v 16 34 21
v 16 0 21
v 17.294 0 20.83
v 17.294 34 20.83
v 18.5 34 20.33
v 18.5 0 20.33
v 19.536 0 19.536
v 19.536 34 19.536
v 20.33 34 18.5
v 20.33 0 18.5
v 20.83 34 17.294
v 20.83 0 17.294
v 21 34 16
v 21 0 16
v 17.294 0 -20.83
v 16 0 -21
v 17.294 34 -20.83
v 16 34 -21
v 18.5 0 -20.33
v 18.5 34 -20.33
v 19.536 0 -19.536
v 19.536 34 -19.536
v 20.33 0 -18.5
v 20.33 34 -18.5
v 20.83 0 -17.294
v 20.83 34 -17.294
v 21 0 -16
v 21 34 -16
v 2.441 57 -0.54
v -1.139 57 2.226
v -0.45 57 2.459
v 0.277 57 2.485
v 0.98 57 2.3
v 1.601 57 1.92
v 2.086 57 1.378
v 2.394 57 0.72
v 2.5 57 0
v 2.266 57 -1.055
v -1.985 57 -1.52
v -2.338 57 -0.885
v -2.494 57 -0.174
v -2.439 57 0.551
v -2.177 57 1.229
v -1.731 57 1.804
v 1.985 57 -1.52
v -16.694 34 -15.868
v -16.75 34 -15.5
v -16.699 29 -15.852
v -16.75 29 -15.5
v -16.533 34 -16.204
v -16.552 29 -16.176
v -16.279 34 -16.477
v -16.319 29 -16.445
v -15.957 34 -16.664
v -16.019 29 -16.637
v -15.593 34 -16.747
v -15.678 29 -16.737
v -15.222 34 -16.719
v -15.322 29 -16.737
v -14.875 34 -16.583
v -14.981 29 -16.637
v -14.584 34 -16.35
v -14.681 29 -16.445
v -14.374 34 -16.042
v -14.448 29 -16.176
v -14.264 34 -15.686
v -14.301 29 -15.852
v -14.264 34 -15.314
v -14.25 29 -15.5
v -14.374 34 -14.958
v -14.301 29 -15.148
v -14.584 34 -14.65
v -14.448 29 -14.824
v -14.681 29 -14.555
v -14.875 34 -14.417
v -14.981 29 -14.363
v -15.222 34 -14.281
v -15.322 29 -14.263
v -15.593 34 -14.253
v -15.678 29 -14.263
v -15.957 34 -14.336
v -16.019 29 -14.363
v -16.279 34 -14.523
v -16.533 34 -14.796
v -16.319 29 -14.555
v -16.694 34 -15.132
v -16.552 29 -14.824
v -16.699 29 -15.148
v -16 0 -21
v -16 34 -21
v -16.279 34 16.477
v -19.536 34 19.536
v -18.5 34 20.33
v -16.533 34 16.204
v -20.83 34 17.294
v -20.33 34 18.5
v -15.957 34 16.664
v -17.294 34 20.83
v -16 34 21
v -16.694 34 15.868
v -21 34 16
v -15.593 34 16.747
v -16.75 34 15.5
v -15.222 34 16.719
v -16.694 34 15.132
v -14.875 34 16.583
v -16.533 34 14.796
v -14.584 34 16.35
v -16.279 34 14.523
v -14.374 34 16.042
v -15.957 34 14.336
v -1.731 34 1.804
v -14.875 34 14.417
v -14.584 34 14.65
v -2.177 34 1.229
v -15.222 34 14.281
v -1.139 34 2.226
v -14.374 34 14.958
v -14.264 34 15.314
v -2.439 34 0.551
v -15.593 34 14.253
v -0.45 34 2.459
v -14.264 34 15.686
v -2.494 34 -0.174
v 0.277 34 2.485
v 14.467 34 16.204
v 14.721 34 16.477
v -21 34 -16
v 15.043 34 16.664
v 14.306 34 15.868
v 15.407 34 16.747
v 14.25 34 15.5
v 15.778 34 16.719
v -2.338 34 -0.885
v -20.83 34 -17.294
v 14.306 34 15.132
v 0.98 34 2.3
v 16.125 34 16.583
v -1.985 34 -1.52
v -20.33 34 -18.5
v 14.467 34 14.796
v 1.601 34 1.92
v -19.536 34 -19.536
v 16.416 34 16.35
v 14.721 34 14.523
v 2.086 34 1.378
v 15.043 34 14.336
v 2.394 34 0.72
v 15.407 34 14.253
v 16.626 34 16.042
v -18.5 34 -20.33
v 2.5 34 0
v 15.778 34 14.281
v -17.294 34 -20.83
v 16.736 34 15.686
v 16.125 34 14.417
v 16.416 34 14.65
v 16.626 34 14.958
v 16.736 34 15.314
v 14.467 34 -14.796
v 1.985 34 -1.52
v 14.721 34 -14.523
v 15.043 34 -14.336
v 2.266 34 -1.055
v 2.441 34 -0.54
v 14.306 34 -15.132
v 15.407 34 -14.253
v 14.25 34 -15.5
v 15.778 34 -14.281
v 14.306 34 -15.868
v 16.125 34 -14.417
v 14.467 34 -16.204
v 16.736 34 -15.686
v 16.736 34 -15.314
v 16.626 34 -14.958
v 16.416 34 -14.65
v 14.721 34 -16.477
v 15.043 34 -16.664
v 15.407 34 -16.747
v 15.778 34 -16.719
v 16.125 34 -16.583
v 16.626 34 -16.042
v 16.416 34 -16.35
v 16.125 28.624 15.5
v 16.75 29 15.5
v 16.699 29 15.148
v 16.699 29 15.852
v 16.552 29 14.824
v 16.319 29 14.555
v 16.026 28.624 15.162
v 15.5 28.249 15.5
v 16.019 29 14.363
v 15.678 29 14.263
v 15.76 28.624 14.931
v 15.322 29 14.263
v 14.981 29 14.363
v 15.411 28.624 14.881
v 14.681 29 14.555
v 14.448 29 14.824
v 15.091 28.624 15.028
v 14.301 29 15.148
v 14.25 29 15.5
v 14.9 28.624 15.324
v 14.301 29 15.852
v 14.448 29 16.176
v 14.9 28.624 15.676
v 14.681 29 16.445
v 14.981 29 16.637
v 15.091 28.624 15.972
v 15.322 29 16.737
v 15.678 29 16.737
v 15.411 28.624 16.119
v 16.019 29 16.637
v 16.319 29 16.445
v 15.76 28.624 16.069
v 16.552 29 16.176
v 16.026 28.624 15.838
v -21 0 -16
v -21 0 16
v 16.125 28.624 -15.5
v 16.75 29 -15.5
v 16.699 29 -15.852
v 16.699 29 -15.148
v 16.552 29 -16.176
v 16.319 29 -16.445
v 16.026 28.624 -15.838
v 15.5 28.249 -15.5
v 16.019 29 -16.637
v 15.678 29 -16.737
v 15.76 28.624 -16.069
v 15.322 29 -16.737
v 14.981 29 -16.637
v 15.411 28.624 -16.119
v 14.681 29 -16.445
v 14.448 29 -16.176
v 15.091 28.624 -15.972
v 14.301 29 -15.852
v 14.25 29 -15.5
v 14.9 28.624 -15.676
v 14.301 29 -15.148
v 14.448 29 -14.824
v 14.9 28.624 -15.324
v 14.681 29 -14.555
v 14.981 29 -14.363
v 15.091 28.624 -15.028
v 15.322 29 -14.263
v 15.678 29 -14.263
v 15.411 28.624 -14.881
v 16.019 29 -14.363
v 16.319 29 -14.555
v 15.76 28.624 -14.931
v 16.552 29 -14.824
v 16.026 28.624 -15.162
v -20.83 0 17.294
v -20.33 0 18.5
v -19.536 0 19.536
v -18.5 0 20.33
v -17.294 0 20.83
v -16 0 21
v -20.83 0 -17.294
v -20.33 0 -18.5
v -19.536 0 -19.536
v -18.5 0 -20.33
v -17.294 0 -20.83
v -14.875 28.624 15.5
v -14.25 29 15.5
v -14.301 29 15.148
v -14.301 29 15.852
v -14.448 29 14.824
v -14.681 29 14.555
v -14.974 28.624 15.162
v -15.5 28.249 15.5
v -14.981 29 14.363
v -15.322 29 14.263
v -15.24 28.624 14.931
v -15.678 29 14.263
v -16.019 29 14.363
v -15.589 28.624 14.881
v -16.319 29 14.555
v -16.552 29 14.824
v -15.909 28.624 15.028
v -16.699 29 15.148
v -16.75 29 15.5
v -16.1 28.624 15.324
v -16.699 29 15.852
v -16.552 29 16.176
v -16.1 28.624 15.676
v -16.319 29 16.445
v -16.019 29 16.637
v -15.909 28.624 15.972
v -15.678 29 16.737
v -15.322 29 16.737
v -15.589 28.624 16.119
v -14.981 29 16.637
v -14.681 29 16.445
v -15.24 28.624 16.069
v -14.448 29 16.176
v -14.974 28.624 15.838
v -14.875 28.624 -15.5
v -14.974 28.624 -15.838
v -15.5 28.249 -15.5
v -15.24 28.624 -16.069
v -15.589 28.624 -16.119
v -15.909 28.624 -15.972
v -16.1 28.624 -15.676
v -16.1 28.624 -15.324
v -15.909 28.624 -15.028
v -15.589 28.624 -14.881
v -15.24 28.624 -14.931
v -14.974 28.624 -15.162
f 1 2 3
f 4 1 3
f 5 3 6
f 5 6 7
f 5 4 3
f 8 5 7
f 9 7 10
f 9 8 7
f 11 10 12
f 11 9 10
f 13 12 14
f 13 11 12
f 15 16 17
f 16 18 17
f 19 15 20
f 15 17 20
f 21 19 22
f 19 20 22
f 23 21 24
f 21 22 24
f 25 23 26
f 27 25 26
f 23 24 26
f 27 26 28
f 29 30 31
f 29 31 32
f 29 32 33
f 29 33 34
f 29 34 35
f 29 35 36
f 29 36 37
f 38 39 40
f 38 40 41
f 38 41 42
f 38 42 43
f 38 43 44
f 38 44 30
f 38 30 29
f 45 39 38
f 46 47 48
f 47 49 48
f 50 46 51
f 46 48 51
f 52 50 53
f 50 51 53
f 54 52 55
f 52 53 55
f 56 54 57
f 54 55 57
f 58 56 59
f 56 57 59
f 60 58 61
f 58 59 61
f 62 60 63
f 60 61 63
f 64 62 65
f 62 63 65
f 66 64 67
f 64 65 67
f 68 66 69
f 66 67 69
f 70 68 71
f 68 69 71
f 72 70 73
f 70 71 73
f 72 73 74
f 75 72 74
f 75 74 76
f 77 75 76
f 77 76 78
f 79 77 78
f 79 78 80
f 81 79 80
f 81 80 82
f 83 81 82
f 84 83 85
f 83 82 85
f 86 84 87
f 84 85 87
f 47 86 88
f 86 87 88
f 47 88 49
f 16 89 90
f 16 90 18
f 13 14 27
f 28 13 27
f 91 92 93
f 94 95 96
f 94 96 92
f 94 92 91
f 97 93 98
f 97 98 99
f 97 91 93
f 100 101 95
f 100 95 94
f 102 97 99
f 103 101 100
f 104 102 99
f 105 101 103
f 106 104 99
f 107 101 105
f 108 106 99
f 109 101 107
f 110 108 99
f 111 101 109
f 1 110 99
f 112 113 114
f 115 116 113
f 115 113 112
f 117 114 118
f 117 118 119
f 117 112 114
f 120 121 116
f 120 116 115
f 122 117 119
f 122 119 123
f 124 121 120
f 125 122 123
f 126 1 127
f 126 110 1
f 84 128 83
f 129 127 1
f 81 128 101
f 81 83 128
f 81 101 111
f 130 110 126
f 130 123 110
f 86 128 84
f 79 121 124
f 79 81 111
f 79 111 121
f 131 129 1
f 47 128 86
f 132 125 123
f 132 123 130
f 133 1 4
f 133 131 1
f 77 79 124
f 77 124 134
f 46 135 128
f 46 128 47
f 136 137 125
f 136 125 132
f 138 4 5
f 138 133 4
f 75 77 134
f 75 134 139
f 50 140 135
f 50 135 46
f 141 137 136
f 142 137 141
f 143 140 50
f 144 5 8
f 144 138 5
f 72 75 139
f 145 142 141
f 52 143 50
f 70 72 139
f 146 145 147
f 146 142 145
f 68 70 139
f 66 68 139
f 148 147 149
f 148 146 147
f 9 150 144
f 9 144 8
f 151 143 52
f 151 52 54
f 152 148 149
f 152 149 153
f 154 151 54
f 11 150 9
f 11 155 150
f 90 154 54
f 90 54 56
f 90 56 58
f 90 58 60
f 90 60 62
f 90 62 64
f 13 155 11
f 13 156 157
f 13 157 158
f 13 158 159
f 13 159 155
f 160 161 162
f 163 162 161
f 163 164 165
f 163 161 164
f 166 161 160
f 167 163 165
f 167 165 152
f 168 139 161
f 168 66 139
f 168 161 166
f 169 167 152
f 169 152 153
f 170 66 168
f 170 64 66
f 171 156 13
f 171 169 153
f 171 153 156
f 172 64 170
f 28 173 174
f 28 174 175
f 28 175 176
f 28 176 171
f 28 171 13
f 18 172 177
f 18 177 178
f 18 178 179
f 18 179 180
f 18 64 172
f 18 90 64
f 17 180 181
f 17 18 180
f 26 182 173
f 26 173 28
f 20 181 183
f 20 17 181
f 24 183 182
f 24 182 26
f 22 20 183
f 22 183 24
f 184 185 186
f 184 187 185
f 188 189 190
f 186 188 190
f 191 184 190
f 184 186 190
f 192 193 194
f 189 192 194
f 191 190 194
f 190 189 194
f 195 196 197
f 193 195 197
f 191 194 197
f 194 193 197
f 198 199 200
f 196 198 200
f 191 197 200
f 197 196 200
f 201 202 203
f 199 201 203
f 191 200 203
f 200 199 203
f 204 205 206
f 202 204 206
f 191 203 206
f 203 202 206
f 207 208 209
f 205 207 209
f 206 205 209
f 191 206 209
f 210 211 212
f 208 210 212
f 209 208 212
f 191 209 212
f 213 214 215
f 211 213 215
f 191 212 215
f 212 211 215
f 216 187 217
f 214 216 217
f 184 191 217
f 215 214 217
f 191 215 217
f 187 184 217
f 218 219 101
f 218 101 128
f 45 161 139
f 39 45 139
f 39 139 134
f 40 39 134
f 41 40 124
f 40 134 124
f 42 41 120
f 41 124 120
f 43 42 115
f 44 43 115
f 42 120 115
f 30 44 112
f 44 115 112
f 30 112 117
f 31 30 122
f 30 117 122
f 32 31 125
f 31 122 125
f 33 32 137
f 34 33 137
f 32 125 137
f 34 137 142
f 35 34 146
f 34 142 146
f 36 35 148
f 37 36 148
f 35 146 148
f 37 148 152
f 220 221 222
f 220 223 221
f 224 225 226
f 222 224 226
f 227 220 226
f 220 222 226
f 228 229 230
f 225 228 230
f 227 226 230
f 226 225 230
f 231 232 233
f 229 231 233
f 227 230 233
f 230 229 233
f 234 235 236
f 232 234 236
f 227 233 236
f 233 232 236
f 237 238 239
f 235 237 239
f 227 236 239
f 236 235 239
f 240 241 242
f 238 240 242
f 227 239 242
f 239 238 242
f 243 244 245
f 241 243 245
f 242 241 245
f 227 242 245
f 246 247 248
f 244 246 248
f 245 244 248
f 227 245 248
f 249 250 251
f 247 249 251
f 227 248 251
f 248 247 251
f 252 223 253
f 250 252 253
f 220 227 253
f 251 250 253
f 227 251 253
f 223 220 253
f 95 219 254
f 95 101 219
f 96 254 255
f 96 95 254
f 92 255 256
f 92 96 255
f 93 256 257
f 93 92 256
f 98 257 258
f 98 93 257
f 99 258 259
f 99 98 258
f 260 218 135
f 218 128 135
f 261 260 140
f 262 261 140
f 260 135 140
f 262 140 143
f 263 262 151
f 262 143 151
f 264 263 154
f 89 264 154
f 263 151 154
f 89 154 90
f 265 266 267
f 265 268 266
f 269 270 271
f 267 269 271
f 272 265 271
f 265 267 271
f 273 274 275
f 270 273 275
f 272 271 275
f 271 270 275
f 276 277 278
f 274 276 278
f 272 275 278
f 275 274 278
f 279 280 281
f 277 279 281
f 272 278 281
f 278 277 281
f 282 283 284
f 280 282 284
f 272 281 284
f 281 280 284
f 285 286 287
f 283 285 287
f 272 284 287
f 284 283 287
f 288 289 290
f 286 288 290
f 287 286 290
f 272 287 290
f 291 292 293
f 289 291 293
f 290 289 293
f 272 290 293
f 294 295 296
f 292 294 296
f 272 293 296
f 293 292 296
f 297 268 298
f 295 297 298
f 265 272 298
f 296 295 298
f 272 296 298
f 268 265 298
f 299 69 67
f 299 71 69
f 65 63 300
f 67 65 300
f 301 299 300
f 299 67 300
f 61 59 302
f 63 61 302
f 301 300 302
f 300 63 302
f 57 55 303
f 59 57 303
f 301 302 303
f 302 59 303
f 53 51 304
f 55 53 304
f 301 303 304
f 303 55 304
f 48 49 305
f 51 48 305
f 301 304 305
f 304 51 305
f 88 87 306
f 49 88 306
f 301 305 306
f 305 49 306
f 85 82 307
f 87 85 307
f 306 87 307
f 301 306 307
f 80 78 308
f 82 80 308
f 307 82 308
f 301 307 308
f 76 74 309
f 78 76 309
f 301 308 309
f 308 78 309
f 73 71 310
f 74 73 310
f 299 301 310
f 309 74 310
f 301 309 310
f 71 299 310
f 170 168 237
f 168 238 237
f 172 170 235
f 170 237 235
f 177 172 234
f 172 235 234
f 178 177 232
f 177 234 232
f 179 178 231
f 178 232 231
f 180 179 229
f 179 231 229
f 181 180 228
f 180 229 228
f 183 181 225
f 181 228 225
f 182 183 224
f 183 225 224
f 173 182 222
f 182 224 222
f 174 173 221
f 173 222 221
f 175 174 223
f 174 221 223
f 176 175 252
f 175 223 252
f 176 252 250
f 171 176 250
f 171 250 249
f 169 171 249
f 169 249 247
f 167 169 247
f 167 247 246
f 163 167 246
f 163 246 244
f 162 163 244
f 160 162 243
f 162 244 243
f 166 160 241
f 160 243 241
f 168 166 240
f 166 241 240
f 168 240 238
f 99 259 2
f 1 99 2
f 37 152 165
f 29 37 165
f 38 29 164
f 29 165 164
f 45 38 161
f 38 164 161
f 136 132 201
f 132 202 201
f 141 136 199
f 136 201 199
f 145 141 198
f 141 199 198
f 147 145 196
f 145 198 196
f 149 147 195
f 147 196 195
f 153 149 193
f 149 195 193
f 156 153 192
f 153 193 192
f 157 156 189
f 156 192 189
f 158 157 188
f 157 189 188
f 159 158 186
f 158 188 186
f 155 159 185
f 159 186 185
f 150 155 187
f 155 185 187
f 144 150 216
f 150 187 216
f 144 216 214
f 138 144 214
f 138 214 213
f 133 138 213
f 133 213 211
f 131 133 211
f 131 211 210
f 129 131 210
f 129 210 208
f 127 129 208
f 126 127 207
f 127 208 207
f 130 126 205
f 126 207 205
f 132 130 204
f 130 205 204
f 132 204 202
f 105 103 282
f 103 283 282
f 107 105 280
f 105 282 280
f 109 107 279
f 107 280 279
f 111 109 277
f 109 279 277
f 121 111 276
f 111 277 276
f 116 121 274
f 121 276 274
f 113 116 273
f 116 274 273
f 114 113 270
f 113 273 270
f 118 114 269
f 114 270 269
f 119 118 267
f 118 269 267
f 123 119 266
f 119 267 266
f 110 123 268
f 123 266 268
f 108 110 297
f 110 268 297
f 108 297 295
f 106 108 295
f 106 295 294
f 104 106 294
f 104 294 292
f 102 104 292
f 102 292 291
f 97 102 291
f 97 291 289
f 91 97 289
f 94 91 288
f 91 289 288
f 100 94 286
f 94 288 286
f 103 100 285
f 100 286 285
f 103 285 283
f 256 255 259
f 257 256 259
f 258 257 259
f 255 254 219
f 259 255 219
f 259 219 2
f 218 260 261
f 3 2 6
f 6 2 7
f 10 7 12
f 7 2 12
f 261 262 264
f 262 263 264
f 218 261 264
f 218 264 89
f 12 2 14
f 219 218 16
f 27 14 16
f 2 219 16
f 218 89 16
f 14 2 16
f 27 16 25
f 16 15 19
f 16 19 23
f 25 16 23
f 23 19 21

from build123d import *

# Parameters (mm, degrees)
SKETCH_1_W             = 42
SKETCH_1_H             = 42
EXTRUDE_1_DEPTH        = 34
HOLE_WIZARD_M3_1_D     = 2.5
HOLE_WIZARD_M3_1_DEPTH = 5
HOLE_WIZARD_M3_1_TIP   = 0.751075774
EXTRUDE_2_DEPTH        = 23
FILLET_1_R             = 5


with BuildPart() as part:
    # 草图1 → 凸台-拉伸1 (new body)
    with BuildSketch(Plane(origin=(0, 0, 0), x_dir=(1, 0, 0), z_dir=(0, 1, 0))):
        Rectangle(SKETCH_1_W, SKETCH_1_H)
    extrude(amount=EXTRUDE_1_DEPTH)

    # M3 螺纹孔1
    with Locations(Plane(origin=(0, 34, 0), x_dir=(1, 0, 0), z_dir=(0, 1, 0))):
        with Locations((-15.5, 15.5), (15.5, -15.5), (-15.5, -15.5), (15.5, 15.5)):
            Hole(HOLE_WIZARD_M3_1_D / 2, depth=HOLE_WIZARD_M3_1_DEPTH)
            with Locations((0, 0, -(HOLE_WIZARD_M3_1_DEPTH + HOLE_WIZARD_M3_1_TIP / 2))):  # 118° drill point
                Cone(0, HOLE_WIZARD_M3_1_D / 2, HOLE_WIZARD_M3_1_TIP, mode=Mode.SUBTRACT)

    # 草图5 → 凸台-拉伸2 (add)
    with BuildSketch(Plane(origin=(0, 34, 0), x_dir=(1, 0, 0), z_dir=(0, 1, 0))):
        with BuildLine():
            Line((1.984567922, 1.520358564), (-1.984567922, 1.520358564))
            ThreePointArc((-1.984567922, 1.520358564), (-0.802676832, -2.367638043), (2.5, 0))
            ThreePointArc((2.5, 0), (2.367638043, 0.802676832), (1.984567922, 1.520358564))
        make_face()
    extrude(amount=EXTRUDE_2_DEPTH)

    # 圆角1
    fillet_1_edges = [part.edges().sort_by_distance(p)[0] for p in [
        (21, 17, 21),
        (-21, 17, 21),
        (-21, 17, -21),
        (21, 17, -21),
    ]]
    fillet(fillet_1_edges, radius=FILLET_1_R)


solid = part.part
